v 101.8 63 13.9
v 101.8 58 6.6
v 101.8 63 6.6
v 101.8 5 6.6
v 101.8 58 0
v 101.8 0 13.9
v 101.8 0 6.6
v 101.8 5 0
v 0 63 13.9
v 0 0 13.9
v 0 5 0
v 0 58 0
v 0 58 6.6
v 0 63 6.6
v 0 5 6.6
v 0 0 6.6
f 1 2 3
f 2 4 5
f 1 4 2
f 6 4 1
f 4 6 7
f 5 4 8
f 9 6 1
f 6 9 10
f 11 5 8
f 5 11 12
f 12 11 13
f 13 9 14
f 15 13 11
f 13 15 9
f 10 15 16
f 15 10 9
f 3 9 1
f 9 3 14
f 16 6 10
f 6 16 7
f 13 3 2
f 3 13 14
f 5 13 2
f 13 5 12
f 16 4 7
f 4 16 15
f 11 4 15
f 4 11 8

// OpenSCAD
/* Examples for viewing */
hart_40v_battery_interface();

module hart_40v_battery_interface()
{
	track_length 				= 101.8;
	
	track_width					= 63.0;

	track_depth					= 13.9;
	track_depth_inner_offset	= 5.0;
	track_inner_depth_major 	= 7.8; 
	track_inner_depth_minor		= 6.6;
	track_outer_depth_major		= track_depth - track_inner_depth_minor;
	track_outer_depth_minor		= track_depth - track_inner_depth_major;
	
	translate([0, 0, 0])
	difference()
	{
		/* Main body */
		cube([track_length, track_width, track_depth]);
		
		/* First cutout */
		translate([-1, track_width - track_depth_inner_offset, -1])
		cube([track_length + 2, track_depth_inner_offset + 1, track_inner_depth_minor + 1]);
		
		/* Second cutout */
		translate([-1, -1, -1])
		cube([track_length + 2, track_depth_inner_offset + 1, track_inner_depth_minor + 1]);
	}
}
